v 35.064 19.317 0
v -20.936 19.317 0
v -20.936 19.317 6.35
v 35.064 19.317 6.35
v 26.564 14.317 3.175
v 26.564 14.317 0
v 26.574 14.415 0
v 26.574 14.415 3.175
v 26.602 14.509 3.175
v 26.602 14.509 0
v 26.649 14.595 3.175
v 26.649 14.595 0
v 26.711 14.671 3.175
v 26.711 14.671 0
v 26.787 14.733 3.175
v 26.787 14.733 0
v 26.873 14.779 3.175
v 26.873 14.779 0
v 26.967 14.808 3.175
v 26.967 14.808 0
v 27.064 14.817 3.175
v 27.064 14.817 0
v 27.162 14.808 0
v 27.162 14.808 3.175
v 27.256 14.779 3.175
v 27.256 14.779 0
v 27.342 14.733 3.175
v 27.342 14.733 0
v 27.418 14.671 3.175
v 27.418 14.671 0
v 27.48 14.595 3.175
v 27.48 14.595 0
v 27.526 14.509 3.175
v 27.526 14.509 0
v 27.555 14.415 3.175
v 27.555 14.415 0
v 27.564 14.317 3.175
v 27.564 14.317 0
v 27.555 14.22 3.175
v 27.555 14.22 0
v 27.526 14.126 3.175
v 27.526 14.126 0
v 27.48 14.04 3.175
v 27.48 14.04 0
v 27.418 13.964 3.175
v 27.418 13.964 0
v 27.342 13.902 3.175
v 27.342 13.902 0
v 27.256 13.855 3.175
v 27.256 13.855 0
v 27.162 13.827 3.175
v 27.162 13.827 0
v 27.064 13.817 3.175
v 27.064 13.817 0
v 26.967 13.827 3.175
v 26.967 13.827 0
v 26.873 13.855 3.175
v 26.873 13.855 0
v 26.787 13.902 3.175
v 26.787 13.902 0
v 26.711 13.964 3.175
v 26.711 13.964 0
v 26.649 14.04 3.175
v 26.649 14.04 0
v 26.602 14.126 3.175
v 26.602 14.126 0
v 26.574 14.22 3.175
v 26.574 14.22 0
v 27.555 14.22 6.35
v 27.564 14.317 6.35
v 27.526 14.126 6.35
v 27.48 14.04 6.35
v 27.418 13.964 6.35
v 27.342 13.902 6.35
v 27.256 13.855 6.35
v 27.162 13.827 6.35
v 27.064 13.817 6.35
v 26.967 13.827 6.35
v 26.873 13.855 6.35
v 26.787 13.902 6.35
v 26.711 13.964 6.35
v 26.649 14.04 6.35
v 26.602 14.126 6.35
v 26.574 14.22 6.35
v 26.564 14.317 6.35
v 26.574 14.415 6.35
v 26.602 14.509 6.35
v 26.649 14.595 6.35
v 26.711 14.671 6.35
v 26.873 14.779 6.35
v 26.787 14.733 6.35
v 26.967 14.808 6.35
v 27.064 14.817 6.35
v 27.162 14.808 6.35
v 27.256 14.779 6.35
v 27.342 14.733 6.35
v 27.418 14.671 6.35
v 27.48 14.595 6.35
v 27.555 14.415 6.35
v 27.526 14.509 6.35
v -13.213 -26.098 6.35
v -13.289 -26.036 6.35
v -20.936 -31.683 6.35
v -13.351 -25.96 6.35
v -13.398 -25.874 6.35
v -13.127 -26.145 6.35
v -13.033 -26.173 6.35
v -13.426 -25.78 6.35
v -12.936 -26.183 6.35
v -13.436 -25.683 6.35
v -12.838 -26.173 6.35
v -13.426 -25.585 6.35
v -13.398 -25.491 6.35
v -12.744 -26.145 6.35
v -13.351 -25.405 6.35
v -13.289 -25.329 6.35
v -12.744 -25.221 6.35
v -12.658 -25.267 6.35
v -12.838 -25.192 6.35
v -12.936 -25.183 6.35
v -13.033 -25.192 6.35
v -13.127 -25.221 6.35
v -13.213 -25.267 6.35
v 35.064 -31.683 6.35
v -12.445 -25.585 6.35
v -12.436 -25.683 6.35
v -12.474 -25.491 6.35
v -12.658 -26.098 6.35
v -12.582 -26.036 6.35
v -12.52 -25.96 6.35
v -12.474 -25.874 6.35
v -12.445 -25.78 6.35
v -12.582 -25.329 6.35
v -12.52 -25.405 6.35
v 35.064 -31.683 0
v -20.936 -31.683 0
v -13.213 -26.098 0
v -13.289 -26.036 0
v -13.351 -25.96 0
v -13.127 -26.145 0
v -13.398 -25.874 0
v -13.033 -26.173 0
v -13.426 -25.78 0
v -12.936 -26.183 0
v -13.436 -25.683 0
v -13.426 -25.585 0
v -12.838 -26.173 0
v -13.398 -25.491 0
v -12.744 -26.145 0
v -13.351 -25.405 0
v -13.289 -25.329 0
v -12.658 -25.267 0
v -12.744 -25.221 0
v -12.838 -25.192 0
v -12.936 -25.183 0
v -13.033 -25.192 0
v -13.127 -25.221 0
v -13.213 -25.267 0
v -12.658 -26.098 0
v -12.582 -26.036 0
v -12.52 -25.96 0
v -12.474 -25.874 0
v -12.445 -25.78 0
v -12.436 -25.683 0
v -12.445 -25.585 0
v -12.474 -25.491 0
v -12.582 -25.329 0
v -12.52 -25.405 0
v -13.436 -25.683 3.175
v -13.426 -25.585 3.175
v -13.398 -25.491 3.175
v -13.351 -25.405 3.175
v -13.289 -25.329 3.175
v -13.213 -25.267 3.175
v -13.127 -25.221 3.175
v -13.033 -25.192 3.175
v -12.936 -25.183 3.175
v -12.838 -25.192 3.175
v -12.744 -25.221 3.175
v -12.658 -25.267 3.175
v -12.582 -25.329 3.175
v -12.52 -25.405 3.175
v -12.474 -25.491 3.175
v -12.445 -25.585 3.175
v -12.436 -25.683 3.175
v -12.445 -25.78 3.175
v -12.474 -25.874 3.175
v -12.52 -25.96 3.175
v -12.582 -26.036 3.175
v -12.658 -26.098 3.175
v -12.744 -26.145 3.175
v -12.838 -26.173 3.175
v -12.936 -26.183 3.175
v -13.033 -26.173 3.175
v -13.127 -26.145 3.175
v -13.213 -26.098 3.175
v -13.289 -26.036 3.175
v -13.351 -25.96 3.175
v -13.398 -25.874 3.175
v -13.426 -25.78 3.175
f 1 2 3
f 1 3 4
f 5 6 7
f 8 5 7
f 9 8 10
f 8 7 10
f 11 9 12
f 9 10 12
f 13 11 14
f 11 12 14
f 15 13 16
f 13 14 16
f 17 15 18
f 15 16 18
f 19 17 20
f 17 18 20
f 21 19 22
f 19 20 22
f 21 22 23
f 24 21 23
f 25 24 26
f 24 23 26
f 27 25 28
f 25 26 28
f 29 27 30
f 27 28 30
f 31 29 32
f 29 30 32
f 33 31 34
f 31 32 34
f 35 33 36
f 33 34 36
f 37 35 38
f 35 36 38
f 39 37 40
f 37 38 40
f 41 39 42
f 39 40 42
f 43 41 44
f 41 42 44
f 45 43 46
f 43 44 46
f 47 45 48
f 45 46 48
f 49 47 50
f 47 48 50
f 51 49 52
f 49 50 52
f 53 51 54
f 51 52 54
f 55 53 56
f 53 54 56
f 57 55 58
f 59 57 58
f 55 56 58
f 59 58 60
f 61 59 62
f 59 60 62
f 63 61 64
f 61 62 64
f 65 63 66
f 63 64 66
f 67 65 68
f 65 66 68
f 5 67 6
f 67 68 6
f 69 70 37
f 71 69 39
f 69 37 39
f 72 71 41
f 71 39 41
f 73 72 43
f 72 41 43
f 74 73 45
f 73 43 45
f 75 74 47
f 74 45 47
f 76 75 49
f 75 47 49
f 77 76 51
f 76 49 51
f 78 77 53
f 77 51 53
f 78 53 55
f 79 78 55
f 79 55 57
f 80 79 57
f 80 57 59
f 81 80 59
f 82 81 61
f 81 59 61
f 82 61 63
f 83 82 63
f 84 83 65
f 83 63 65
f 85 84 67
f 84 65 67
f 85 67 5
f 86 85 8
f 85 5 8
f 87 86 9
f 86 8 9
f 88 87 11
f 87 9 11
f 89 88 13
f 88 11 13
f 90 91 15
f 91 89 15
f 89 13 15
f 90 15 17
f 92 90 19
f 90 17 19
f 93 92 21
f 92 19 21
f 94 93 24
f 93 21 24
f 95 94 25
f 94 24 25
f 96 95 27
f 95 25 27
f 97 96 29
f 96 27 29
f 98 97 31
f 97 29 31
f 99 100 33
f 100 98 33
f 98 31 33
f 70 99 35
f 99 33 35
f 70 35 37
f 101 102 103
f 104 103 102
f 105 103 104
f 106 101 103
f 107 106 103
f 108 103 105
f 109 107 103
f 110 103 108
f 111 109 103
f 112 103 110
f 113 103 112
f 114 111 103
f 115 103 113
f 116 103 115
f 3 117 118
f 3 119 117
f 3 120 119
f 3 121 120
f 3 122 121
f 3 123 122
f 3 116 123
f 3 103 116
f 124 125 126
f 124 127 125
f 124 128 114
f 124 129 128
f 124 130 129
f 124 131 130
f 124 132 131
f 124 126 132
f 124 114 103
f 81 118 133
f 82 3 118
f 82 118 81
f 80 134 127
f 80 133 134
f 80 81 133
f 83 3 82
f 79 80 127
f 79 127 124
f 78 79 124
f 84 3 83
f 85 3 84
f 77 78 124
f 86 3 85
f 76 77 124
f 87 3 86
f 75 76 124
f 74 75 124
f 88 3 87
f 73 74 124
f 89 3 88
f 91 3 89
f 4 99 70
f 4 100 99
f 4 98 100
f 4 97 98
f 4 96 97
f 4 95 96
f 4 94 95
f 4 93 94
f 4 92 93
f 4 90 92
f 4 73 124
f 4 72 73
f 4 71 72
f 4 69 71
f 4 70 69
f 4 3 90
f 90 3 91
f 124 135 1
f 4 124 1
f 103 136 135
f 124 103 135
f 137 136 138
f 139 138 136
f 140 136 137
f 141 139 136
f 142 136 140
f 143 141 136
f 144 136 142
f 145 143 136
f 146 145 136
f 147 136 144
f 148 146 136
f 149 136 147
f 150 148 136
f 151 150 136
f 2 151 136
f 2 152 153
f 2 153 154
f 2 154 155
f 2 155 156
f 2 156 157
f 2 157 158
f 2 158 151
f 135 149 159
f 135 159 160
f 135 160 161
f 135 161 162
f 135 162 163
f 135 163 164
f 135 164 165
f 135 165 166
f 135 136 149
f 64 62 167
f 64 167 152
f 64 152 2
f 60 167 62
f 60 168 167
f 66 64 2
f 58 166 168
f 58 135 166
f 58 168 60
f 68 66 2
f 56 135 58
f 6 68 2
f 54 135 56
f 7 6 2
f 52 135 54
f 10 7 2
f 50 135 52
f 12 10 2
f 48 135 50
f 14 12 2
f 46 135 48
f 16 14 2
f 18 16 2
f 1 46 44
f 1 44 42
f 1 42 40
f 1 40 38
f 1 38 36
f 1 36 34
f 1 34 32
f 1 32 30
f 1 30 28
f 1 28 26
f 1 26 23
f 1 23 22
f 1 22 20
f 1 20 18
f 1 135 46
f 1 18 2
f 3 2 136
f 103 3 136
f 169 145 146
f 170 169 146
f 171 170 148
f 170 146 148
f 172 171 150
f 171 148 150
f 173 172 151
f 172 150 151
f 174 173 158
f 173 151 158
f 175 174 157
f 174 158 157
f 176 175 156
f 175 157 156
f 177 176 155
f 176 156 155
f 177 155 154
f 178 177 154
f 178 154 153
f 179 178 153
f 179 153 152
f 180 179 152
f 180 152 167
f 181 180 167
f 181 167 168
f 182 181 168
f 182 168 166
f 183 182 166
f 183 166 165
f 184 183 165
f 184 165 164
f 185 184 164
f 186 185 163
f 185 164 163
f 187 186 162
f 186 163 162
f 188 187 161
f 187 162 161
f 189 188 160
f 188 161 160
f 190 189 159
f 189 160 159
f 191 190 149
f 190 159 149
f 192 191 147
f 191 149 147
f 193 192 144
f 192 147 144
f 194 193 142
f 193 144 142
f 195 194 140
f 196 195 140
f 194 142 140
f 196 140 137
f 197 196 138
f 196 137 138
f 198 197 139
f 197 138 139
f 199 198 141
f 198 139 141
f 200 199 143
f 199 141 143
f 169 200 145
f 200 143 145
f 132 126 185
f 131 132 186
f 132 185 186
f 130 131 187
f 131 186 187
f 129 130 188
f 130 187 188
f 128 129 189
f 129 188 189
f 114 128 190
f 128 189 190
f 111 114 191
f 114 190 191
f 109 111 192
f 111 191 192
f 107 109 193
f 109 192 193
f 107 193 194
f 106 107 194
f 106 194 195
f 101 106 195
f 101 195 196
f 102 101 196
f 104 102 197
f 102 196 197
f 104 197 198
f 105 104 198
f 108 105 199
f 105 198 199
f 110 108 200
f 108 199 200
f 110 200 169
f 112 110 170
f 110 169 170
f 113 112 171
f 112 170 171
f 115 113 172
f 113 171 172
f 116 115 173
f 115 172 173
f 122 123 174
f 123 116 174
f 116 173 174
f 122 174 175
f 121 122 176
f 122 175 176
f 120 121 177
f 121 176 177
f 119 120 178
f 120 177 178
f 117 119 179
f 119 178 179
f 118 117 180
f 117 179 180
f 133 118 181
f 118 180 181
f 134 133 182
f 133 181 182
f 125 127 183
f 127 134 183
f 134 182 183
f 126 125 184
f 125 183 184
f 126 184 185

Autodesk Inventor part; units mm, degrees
ref_plane "YZ Plane" through (0, 0, 0) normal (1, 0, 0) x (0, 1, 0)
ref_plane "XZ Plane" through (0, 0, 0) normal (0, 1, 0) x (-1, 0, 0)
ref_plane "XY Plane" through (0, 0, 0) normal (0, 0, 1) x (1, 0, 0)
sketch "Sketch1" plane through (0, 0, 0) normal (0, 0, 1) x (1, 0, 0)
  line L0 (-22.6981, 19.3174) -> (27.3019, 19.3174)
  line L1 (27.3019, 19.3174) -> (27.3019, -30.6826)
  line L2 (27.3019, -30.6826) -> (-22.6981, -30.6826)
  line L3 (-22.6981, -30.6826) -> (-22.6981, 19.3174)
  point P0 (0, 0)
  dimension "d0" = 50
  dimension "d1" = 50
extrude "Extrusion1" add sketch "Sketch1" along normal blind 3.175
sketch "Sketch2" plane through (27.3019, -30.6826, 0) normal (1, 0, 0) x (0, 0, -1)
  line L0 (-3.175, 50) -> (-3.175, 0) projected
  line L1 (0, 0) -> (-3.175, 0) projected
  line L2 (0, 50) -> (0, 0) projected
  line L3 (0, 50) -> (-3.175, 50) projected
  point P0 (0, 30.6826)
extrude "Extrusion2" add sketch "Sketch2" along normal blind 9.525
sketch "Sketch3" plane through (0, 0, 3.175) normal (0, 0, 1) x (1, 0, 0)
  line L0 (-22.6981, -30.6826) -> (-22.6981, 19.3174) projected
  line L1 (36.8269, -30.6826) -> (-22.6981, -30.6826) projected
  line L2 (-22.6981, 19.3174) -> (-19.5231, 19.3174)
  line L3 (-19.5231, 19.3174) -> (-19.5231, 4.3174)
  line L4 (-19.5231, 4.3174) -> (-22.6981, 4.3174)
  line L5 (-22.6981, 4.3174) -> (-22.6981, 19.3174)
  line L6 (36.8269, 19.3174) -> (33.6519, 19.3174)
  line L7 (33.6519, 19.3174) -> (33.6519, 4.3174)
  line L8 (33.6519, 4.3174) -> (36.8269, 4.3174)
  line L9 (36.8269, 4.3174) -> (36.8269, 19.3174)
  line L10 (36.8269, -30.6826) -> (33.6519, -30.6826)
  line L11 (33.6519, -30.6826) -> (33.6519, -15.6826)
  line L12 (33.6519, -15.6826) -> (36.8269, -15.6826)
  line L13 (36.8269, -15.6826) -> (36.8269, -30.6826)
  line L14 (-22.6981, -15.6826) -> (-19.5231, -15.6826)
  line L15 (-19.5231, -15.6826) -> (-19.5231, -30.6826)
  line L16 (-19.5231, -30.6826) -> (-22.6981, -30.6826)
  line L17 (-22.6981, -30.6826) -> (-22.6981, -15.6826)
  point P0 (0, 0)
  dimension "d6" = 3.175
  dimension "d7" = 15
  dimension "d8" = 3.175
  dimension "d9" = 15
extrude "Extrusion3" cut sketch "Sketch3" against normal blind 9.525
sketch "Sketch4" plane through (0, 0, 0) normal (0, 0, -1) x (-1, 0, 0)
  line L0 (-33.6519, -30.6826) -> (19.5231, -30.6826) projected
  line L1 (19.5231, 19.3174) -> (-33.6519, 19.3174) projected
  line L2 (-7.0644, 19.3174) -> (-27.0644, 19.3174)
  line L3 (-27.0644, 19.3174) -> (-27.0644, 14.3174)
  line L4 (-7.0644, -30.6826) -> (12.9356, -30.6826)
  line L5 (12.9356, -30.6826) -> (12.9356, -25.6826)
  circle A0 centre (-27.0644, 14.3174) radius 0.5
  circle A1 centre (12.9356, -25.6826) radius 0.5
  point P0 (0, 0)
  dimension "d12" = 20
  dimension "d13" = 5
  dimension "d14" = 20
  dimension "d15" = 5
  dimension "d16" = 1
  dimension "d17" = 1
extrude "Extrusion4" cut sketch "Sketch4" against normal blind 25.4
sketch "Sketch5" plane through (0, 0, 0) normal (0, 0, -1) x (-1, 0, 0)
  line L0 (-33.6519, 4.3174) -> (-36.8269, 4.3174) projected
  line L1 (-36.8269, 4.3174) -> (-36.8269, -15.6826) projected
  line L2 (-36.8269, -15.6826) -> (-33.6519, -15.6826) projected
  line L3 (-33.6519, -15.6826) -> (-33.6519, -30.6826) projected
  line L4 (-33.6519, -30.6826) -> (19.5231, -30.6826) projected
  line L5 (19.5231, -30.6826) -> (19.5231, -15.6826) projected
  line L6 (19.5231, -15.6826) -> (22.6981, -15.6826) projected
  line L7 (22.6981, -15.6826) -> (22.6981, 4.3174) projected
  line L8 (22.6981, 4.3174) -> (19.5231, 4.3174) projected
  line L9 (19.5231, 4.3174) -> (19.5231, 19.3174) projected
  line L10 (19.5231, 19.3174) -> (-33.6519, 19.3174) projected
  line L11 (-33.6519, 19.3174) -> (-33.6519, 4.3174) projected
  line L12 (19.5231, -30.6826) -> (17.9356, -30.6826)
  line L13 (17.9356, -30.6826) -> (17.9356, 19.3174)
  line L14 (-33.6519, 19.3174) -> (-32.0644, 19.3174)
  line L15 (-32.0644, 19.3174) -> (-32.0644, -30.6826)
  point P0 (0, 0)
  dimension "d20" = 1.5875
  dimension "d21" = 1.5875
extrude "Extrusion5" cut sketch "Sketch5" against normal blind 25.4 contours L11 L10 L15 L4 L3 L2 L1 L0 | L10 L9 L8 L7 L6 L5 L4 L13
sketch "Sketch6" plane through (-17.9356, -30.6826, 0) normal (0, -1, 0) x (1, 0, 0)
  line L0 (0, 3.175) -> (0, 0) projected
  line L1 (50, 0) -> (0, 0) projected
  line L2 (50, 0) -> (50, 3.175) projected
  line L3 (50, 3.175) -> (0, 3.175) projected
  point P0 (17.9356, 0)
extrude "Extrusion6" add sketch "Sketch6" along normal blind 3.175
sketch "Sketch7" plane through (-17.9356, 19.3174, 0) normal (-1, 0, 0) x (0, 0, 1)
  line L0 (3.175, 0) -> (3.175, -53.175) projected
  line L1 (0, 0) -> (3.175, 0) projected
  line L2 (0, 0) -> (0, -53.175) projected
  line L3 (0, -53.175) -> (3.175, -53.175) projected
  point P0 (0, -19.3174)
extrude "Extrusion7" add sketch "Sketch7" along normal blind 1.27
sketch "Sketch8" plane through (32.0644, 19.3174, 3.175) normal (1, 0, 0) x (0, 0, -1)
  line L0 (0, -53.175) -> (0, 0) projected
  line L1 (0, -53.175) -> (3.175, -53.175) projected
  line L2 (3.175, 0) -> (3.175, -53.175) projected
  line L3 (0, 0) -> (3.175, 0) projected
  point P0 (3.175, -19.3174)
extrude "Extrusion8" add sketch "Sketch8" along normal blind 1.27
sketch "Sketch9" plane through (-17.9356, -33.8576, 0) normal (0, -1, 0) x (1, 0, 0)
  line L0 (-1.27, 3.175) -> (51.27, 3.175) projected
  line L1 (-1.27, 3.175) -> (-1.27, 0) projected
  line L2 (51.27, 0) -> (-1.27, 0) projected
  line L3 (51.27, 0) -> (51.27, 3.175) projected
  point P0 (17.9356, 0)
extrude "Extrusion9" cut sketch "Sketch9" against normal blind 3.175
sketch "Sketch10" plane through (-17.9356, -30.6826, 0) normal (0, -1, 0) x (1, 0, 0)
  line L0 (-1.27, 0) -> (-1.27, 3.175) projected
  line L1 (51.27, 0) -> (-1.27, 0) projected
  line L2 (51.27, 3.175) -> (51.27, 0) projected
  line L3 (-1.27, 3.175) -> (51.27, 3.175) projected
  point P0 (17.9356, 0)
extrude "Extrusion10" add sketch "Sketch10" along normal blind 1.27
sketch "Sketch11" plane through (33.3344, 19.3174, 3.175) normal (1, 0, 0) x (0, 0, -1)
  line L0 (3.175, 0) -> (3.175, -51.27) projected
  line L1 (0, 0) -> (3.175, 0) projected
  line L2 (0, -51.27) -> (0, 0) projected
  line L3 (0, -51.27) -> (3.175, -51.27) projected
  point P0 (3.175, -19.3174)
extrude "Extrusion11" cut sketch "Sketch11" against normal blind 1.27
sketch "Sketch12" plane through (-17.9356, -31.9526, 0) normal (0, -1, 0) x (1, 0, 0)
  line L0 (50, 0) -> (50, 3.175) projected
  line L1 (-1.27, 3.175) -> (50, 3.175) projected
  line L2 (-1.27, 0) -> (-1.27, 3.175) projected
  line L3 (50, 0) -> (-1.27, 0) projected
  point P0 (17.9356, 0)
extrude "Extrusion12" cut sketch "Sketch12" against normal blind 1.27
sketch "Sketch13" plane through (-19.2056, 19.3174, 0) normal (-1, 0, 0) x (0, 0, 1)
  line L0 (0, -50) -> (3.175, -50) projected
  line L1 (3.175, 0) -> (3.175, -50) projected
  line L2 (0, 0) -> (3.175, 0) projected
  line L3 (0, -50) -> (0, 0) projected
  point P0 (0, -19.3174)
extrude "Extrusion13" cut sketch "Sketch13" against normal blind 1.27
sketch "Sketch14" plane through (-17.9356, -30.6826, 0) normal (0, -1, 0) x (1, 0, 0)
  line L0 (0, 3.175) -> (0, 0) projected
  line L1 (50, 0) -> (0, 0) projected
  line L2 (50, 3.175) -> (50, 0) projected
  line L3 (0, 3.175) -> (50, 3.175) projected
  point P0 (17.9356, 0)
extrude "Extrusion14" add sketch "Sketch14" along normal blind 1
sketch "Sketch15" plane through (-17.9356, 19.3174, 0) normal (-1, 0, 0) x (0, 0, 1)
  line L0 (3.175, 0) -> (3.175, -51) projected
  line L1 (0, 0) -> (3.175, 0) projected
  line L2 (0, 0) -> (0, -51) projected
  line L3 (0, -51) -> (3.175, -51) projected
  point P0 (0, -19.3174)
extrude "Extrusion15" add sketch "Sketch15" along normal blind 1
sketch "Sketch16" plane through (32.0644, 19.3174, 3.175) normal (1, 0, 0) x (0, 0, -1)
  line L0 (3.175, 0) -> (3.175, -51) projected
  line L1 (0, 0) -> (3.175, 0) projected
  line L2 (0, -51) -> (0, 0) projected
  line L3 (0, -51) -> (3.175, -51) projected
  point P0 (3.175, -19.3174)
extrude "Extrusion16" add sketch "Sketch16" along normal blind 1
sketch "Sketch17" plane through (33.0644, 19.3174, 3.175) normal (1, 0, 0) x (0, 0, -1)
  line L0 (3.175, -51) -> (0, -51) projected
  line L1 (3.175, 0) -> (3.175, -51) projected
  line L2 (0, 0) -> (3.175, 0) projected
  line L3 (0, -51) -> (0, 0) projected
  point P0 (3.175, -19.3174)
extrude "Extrusion17" add sketch "Sketch17" along normal blind 2
sketch "Sketch18" plane through (-18.9356, 19.3174, 0) normal (-1, 0, 0) x (0, 0, 1)
  line L0 (3.175, -51) -> (0, -51) projected
  line L1 (3.175, 0) -> (3.175, -51) projected
  line L2 (0, 0) -> (3.175, 0) projected
  line L3 (0, -51) -> (0, 0) projected
  point P0 (0, -19.3174)
extrude "Extrusion18" add sketch "Sketch18" along normal blind 2
sketch "Sketch19" plane through (0, 0, 3.175) normal (0, 0, 1) x (1, 0, 0)
  line L0 (-20.9356, -31.6826) -> (35.0644, -31.6826) projected
  line L1 (35.0644, -31.6826) -> (35.0644, 19.3174) projected
  line L2 (-20.9356, 19.3174) -> (35.0644, 19.3174) projected
  line L3 (-20.9356, 19.3174) -> (-20.9356, -31.6826) projected
  circle A0 centre (27.0644, 14.3174) radius 0.5 projected
  circle A1 centre (-12.9356, -25.6826) radius 0.5 projected
  point P0 (0, 0)
extrude "Extrusion19" add sketch "Sketch19" along normal blind 3.175
properties part number "h base"
